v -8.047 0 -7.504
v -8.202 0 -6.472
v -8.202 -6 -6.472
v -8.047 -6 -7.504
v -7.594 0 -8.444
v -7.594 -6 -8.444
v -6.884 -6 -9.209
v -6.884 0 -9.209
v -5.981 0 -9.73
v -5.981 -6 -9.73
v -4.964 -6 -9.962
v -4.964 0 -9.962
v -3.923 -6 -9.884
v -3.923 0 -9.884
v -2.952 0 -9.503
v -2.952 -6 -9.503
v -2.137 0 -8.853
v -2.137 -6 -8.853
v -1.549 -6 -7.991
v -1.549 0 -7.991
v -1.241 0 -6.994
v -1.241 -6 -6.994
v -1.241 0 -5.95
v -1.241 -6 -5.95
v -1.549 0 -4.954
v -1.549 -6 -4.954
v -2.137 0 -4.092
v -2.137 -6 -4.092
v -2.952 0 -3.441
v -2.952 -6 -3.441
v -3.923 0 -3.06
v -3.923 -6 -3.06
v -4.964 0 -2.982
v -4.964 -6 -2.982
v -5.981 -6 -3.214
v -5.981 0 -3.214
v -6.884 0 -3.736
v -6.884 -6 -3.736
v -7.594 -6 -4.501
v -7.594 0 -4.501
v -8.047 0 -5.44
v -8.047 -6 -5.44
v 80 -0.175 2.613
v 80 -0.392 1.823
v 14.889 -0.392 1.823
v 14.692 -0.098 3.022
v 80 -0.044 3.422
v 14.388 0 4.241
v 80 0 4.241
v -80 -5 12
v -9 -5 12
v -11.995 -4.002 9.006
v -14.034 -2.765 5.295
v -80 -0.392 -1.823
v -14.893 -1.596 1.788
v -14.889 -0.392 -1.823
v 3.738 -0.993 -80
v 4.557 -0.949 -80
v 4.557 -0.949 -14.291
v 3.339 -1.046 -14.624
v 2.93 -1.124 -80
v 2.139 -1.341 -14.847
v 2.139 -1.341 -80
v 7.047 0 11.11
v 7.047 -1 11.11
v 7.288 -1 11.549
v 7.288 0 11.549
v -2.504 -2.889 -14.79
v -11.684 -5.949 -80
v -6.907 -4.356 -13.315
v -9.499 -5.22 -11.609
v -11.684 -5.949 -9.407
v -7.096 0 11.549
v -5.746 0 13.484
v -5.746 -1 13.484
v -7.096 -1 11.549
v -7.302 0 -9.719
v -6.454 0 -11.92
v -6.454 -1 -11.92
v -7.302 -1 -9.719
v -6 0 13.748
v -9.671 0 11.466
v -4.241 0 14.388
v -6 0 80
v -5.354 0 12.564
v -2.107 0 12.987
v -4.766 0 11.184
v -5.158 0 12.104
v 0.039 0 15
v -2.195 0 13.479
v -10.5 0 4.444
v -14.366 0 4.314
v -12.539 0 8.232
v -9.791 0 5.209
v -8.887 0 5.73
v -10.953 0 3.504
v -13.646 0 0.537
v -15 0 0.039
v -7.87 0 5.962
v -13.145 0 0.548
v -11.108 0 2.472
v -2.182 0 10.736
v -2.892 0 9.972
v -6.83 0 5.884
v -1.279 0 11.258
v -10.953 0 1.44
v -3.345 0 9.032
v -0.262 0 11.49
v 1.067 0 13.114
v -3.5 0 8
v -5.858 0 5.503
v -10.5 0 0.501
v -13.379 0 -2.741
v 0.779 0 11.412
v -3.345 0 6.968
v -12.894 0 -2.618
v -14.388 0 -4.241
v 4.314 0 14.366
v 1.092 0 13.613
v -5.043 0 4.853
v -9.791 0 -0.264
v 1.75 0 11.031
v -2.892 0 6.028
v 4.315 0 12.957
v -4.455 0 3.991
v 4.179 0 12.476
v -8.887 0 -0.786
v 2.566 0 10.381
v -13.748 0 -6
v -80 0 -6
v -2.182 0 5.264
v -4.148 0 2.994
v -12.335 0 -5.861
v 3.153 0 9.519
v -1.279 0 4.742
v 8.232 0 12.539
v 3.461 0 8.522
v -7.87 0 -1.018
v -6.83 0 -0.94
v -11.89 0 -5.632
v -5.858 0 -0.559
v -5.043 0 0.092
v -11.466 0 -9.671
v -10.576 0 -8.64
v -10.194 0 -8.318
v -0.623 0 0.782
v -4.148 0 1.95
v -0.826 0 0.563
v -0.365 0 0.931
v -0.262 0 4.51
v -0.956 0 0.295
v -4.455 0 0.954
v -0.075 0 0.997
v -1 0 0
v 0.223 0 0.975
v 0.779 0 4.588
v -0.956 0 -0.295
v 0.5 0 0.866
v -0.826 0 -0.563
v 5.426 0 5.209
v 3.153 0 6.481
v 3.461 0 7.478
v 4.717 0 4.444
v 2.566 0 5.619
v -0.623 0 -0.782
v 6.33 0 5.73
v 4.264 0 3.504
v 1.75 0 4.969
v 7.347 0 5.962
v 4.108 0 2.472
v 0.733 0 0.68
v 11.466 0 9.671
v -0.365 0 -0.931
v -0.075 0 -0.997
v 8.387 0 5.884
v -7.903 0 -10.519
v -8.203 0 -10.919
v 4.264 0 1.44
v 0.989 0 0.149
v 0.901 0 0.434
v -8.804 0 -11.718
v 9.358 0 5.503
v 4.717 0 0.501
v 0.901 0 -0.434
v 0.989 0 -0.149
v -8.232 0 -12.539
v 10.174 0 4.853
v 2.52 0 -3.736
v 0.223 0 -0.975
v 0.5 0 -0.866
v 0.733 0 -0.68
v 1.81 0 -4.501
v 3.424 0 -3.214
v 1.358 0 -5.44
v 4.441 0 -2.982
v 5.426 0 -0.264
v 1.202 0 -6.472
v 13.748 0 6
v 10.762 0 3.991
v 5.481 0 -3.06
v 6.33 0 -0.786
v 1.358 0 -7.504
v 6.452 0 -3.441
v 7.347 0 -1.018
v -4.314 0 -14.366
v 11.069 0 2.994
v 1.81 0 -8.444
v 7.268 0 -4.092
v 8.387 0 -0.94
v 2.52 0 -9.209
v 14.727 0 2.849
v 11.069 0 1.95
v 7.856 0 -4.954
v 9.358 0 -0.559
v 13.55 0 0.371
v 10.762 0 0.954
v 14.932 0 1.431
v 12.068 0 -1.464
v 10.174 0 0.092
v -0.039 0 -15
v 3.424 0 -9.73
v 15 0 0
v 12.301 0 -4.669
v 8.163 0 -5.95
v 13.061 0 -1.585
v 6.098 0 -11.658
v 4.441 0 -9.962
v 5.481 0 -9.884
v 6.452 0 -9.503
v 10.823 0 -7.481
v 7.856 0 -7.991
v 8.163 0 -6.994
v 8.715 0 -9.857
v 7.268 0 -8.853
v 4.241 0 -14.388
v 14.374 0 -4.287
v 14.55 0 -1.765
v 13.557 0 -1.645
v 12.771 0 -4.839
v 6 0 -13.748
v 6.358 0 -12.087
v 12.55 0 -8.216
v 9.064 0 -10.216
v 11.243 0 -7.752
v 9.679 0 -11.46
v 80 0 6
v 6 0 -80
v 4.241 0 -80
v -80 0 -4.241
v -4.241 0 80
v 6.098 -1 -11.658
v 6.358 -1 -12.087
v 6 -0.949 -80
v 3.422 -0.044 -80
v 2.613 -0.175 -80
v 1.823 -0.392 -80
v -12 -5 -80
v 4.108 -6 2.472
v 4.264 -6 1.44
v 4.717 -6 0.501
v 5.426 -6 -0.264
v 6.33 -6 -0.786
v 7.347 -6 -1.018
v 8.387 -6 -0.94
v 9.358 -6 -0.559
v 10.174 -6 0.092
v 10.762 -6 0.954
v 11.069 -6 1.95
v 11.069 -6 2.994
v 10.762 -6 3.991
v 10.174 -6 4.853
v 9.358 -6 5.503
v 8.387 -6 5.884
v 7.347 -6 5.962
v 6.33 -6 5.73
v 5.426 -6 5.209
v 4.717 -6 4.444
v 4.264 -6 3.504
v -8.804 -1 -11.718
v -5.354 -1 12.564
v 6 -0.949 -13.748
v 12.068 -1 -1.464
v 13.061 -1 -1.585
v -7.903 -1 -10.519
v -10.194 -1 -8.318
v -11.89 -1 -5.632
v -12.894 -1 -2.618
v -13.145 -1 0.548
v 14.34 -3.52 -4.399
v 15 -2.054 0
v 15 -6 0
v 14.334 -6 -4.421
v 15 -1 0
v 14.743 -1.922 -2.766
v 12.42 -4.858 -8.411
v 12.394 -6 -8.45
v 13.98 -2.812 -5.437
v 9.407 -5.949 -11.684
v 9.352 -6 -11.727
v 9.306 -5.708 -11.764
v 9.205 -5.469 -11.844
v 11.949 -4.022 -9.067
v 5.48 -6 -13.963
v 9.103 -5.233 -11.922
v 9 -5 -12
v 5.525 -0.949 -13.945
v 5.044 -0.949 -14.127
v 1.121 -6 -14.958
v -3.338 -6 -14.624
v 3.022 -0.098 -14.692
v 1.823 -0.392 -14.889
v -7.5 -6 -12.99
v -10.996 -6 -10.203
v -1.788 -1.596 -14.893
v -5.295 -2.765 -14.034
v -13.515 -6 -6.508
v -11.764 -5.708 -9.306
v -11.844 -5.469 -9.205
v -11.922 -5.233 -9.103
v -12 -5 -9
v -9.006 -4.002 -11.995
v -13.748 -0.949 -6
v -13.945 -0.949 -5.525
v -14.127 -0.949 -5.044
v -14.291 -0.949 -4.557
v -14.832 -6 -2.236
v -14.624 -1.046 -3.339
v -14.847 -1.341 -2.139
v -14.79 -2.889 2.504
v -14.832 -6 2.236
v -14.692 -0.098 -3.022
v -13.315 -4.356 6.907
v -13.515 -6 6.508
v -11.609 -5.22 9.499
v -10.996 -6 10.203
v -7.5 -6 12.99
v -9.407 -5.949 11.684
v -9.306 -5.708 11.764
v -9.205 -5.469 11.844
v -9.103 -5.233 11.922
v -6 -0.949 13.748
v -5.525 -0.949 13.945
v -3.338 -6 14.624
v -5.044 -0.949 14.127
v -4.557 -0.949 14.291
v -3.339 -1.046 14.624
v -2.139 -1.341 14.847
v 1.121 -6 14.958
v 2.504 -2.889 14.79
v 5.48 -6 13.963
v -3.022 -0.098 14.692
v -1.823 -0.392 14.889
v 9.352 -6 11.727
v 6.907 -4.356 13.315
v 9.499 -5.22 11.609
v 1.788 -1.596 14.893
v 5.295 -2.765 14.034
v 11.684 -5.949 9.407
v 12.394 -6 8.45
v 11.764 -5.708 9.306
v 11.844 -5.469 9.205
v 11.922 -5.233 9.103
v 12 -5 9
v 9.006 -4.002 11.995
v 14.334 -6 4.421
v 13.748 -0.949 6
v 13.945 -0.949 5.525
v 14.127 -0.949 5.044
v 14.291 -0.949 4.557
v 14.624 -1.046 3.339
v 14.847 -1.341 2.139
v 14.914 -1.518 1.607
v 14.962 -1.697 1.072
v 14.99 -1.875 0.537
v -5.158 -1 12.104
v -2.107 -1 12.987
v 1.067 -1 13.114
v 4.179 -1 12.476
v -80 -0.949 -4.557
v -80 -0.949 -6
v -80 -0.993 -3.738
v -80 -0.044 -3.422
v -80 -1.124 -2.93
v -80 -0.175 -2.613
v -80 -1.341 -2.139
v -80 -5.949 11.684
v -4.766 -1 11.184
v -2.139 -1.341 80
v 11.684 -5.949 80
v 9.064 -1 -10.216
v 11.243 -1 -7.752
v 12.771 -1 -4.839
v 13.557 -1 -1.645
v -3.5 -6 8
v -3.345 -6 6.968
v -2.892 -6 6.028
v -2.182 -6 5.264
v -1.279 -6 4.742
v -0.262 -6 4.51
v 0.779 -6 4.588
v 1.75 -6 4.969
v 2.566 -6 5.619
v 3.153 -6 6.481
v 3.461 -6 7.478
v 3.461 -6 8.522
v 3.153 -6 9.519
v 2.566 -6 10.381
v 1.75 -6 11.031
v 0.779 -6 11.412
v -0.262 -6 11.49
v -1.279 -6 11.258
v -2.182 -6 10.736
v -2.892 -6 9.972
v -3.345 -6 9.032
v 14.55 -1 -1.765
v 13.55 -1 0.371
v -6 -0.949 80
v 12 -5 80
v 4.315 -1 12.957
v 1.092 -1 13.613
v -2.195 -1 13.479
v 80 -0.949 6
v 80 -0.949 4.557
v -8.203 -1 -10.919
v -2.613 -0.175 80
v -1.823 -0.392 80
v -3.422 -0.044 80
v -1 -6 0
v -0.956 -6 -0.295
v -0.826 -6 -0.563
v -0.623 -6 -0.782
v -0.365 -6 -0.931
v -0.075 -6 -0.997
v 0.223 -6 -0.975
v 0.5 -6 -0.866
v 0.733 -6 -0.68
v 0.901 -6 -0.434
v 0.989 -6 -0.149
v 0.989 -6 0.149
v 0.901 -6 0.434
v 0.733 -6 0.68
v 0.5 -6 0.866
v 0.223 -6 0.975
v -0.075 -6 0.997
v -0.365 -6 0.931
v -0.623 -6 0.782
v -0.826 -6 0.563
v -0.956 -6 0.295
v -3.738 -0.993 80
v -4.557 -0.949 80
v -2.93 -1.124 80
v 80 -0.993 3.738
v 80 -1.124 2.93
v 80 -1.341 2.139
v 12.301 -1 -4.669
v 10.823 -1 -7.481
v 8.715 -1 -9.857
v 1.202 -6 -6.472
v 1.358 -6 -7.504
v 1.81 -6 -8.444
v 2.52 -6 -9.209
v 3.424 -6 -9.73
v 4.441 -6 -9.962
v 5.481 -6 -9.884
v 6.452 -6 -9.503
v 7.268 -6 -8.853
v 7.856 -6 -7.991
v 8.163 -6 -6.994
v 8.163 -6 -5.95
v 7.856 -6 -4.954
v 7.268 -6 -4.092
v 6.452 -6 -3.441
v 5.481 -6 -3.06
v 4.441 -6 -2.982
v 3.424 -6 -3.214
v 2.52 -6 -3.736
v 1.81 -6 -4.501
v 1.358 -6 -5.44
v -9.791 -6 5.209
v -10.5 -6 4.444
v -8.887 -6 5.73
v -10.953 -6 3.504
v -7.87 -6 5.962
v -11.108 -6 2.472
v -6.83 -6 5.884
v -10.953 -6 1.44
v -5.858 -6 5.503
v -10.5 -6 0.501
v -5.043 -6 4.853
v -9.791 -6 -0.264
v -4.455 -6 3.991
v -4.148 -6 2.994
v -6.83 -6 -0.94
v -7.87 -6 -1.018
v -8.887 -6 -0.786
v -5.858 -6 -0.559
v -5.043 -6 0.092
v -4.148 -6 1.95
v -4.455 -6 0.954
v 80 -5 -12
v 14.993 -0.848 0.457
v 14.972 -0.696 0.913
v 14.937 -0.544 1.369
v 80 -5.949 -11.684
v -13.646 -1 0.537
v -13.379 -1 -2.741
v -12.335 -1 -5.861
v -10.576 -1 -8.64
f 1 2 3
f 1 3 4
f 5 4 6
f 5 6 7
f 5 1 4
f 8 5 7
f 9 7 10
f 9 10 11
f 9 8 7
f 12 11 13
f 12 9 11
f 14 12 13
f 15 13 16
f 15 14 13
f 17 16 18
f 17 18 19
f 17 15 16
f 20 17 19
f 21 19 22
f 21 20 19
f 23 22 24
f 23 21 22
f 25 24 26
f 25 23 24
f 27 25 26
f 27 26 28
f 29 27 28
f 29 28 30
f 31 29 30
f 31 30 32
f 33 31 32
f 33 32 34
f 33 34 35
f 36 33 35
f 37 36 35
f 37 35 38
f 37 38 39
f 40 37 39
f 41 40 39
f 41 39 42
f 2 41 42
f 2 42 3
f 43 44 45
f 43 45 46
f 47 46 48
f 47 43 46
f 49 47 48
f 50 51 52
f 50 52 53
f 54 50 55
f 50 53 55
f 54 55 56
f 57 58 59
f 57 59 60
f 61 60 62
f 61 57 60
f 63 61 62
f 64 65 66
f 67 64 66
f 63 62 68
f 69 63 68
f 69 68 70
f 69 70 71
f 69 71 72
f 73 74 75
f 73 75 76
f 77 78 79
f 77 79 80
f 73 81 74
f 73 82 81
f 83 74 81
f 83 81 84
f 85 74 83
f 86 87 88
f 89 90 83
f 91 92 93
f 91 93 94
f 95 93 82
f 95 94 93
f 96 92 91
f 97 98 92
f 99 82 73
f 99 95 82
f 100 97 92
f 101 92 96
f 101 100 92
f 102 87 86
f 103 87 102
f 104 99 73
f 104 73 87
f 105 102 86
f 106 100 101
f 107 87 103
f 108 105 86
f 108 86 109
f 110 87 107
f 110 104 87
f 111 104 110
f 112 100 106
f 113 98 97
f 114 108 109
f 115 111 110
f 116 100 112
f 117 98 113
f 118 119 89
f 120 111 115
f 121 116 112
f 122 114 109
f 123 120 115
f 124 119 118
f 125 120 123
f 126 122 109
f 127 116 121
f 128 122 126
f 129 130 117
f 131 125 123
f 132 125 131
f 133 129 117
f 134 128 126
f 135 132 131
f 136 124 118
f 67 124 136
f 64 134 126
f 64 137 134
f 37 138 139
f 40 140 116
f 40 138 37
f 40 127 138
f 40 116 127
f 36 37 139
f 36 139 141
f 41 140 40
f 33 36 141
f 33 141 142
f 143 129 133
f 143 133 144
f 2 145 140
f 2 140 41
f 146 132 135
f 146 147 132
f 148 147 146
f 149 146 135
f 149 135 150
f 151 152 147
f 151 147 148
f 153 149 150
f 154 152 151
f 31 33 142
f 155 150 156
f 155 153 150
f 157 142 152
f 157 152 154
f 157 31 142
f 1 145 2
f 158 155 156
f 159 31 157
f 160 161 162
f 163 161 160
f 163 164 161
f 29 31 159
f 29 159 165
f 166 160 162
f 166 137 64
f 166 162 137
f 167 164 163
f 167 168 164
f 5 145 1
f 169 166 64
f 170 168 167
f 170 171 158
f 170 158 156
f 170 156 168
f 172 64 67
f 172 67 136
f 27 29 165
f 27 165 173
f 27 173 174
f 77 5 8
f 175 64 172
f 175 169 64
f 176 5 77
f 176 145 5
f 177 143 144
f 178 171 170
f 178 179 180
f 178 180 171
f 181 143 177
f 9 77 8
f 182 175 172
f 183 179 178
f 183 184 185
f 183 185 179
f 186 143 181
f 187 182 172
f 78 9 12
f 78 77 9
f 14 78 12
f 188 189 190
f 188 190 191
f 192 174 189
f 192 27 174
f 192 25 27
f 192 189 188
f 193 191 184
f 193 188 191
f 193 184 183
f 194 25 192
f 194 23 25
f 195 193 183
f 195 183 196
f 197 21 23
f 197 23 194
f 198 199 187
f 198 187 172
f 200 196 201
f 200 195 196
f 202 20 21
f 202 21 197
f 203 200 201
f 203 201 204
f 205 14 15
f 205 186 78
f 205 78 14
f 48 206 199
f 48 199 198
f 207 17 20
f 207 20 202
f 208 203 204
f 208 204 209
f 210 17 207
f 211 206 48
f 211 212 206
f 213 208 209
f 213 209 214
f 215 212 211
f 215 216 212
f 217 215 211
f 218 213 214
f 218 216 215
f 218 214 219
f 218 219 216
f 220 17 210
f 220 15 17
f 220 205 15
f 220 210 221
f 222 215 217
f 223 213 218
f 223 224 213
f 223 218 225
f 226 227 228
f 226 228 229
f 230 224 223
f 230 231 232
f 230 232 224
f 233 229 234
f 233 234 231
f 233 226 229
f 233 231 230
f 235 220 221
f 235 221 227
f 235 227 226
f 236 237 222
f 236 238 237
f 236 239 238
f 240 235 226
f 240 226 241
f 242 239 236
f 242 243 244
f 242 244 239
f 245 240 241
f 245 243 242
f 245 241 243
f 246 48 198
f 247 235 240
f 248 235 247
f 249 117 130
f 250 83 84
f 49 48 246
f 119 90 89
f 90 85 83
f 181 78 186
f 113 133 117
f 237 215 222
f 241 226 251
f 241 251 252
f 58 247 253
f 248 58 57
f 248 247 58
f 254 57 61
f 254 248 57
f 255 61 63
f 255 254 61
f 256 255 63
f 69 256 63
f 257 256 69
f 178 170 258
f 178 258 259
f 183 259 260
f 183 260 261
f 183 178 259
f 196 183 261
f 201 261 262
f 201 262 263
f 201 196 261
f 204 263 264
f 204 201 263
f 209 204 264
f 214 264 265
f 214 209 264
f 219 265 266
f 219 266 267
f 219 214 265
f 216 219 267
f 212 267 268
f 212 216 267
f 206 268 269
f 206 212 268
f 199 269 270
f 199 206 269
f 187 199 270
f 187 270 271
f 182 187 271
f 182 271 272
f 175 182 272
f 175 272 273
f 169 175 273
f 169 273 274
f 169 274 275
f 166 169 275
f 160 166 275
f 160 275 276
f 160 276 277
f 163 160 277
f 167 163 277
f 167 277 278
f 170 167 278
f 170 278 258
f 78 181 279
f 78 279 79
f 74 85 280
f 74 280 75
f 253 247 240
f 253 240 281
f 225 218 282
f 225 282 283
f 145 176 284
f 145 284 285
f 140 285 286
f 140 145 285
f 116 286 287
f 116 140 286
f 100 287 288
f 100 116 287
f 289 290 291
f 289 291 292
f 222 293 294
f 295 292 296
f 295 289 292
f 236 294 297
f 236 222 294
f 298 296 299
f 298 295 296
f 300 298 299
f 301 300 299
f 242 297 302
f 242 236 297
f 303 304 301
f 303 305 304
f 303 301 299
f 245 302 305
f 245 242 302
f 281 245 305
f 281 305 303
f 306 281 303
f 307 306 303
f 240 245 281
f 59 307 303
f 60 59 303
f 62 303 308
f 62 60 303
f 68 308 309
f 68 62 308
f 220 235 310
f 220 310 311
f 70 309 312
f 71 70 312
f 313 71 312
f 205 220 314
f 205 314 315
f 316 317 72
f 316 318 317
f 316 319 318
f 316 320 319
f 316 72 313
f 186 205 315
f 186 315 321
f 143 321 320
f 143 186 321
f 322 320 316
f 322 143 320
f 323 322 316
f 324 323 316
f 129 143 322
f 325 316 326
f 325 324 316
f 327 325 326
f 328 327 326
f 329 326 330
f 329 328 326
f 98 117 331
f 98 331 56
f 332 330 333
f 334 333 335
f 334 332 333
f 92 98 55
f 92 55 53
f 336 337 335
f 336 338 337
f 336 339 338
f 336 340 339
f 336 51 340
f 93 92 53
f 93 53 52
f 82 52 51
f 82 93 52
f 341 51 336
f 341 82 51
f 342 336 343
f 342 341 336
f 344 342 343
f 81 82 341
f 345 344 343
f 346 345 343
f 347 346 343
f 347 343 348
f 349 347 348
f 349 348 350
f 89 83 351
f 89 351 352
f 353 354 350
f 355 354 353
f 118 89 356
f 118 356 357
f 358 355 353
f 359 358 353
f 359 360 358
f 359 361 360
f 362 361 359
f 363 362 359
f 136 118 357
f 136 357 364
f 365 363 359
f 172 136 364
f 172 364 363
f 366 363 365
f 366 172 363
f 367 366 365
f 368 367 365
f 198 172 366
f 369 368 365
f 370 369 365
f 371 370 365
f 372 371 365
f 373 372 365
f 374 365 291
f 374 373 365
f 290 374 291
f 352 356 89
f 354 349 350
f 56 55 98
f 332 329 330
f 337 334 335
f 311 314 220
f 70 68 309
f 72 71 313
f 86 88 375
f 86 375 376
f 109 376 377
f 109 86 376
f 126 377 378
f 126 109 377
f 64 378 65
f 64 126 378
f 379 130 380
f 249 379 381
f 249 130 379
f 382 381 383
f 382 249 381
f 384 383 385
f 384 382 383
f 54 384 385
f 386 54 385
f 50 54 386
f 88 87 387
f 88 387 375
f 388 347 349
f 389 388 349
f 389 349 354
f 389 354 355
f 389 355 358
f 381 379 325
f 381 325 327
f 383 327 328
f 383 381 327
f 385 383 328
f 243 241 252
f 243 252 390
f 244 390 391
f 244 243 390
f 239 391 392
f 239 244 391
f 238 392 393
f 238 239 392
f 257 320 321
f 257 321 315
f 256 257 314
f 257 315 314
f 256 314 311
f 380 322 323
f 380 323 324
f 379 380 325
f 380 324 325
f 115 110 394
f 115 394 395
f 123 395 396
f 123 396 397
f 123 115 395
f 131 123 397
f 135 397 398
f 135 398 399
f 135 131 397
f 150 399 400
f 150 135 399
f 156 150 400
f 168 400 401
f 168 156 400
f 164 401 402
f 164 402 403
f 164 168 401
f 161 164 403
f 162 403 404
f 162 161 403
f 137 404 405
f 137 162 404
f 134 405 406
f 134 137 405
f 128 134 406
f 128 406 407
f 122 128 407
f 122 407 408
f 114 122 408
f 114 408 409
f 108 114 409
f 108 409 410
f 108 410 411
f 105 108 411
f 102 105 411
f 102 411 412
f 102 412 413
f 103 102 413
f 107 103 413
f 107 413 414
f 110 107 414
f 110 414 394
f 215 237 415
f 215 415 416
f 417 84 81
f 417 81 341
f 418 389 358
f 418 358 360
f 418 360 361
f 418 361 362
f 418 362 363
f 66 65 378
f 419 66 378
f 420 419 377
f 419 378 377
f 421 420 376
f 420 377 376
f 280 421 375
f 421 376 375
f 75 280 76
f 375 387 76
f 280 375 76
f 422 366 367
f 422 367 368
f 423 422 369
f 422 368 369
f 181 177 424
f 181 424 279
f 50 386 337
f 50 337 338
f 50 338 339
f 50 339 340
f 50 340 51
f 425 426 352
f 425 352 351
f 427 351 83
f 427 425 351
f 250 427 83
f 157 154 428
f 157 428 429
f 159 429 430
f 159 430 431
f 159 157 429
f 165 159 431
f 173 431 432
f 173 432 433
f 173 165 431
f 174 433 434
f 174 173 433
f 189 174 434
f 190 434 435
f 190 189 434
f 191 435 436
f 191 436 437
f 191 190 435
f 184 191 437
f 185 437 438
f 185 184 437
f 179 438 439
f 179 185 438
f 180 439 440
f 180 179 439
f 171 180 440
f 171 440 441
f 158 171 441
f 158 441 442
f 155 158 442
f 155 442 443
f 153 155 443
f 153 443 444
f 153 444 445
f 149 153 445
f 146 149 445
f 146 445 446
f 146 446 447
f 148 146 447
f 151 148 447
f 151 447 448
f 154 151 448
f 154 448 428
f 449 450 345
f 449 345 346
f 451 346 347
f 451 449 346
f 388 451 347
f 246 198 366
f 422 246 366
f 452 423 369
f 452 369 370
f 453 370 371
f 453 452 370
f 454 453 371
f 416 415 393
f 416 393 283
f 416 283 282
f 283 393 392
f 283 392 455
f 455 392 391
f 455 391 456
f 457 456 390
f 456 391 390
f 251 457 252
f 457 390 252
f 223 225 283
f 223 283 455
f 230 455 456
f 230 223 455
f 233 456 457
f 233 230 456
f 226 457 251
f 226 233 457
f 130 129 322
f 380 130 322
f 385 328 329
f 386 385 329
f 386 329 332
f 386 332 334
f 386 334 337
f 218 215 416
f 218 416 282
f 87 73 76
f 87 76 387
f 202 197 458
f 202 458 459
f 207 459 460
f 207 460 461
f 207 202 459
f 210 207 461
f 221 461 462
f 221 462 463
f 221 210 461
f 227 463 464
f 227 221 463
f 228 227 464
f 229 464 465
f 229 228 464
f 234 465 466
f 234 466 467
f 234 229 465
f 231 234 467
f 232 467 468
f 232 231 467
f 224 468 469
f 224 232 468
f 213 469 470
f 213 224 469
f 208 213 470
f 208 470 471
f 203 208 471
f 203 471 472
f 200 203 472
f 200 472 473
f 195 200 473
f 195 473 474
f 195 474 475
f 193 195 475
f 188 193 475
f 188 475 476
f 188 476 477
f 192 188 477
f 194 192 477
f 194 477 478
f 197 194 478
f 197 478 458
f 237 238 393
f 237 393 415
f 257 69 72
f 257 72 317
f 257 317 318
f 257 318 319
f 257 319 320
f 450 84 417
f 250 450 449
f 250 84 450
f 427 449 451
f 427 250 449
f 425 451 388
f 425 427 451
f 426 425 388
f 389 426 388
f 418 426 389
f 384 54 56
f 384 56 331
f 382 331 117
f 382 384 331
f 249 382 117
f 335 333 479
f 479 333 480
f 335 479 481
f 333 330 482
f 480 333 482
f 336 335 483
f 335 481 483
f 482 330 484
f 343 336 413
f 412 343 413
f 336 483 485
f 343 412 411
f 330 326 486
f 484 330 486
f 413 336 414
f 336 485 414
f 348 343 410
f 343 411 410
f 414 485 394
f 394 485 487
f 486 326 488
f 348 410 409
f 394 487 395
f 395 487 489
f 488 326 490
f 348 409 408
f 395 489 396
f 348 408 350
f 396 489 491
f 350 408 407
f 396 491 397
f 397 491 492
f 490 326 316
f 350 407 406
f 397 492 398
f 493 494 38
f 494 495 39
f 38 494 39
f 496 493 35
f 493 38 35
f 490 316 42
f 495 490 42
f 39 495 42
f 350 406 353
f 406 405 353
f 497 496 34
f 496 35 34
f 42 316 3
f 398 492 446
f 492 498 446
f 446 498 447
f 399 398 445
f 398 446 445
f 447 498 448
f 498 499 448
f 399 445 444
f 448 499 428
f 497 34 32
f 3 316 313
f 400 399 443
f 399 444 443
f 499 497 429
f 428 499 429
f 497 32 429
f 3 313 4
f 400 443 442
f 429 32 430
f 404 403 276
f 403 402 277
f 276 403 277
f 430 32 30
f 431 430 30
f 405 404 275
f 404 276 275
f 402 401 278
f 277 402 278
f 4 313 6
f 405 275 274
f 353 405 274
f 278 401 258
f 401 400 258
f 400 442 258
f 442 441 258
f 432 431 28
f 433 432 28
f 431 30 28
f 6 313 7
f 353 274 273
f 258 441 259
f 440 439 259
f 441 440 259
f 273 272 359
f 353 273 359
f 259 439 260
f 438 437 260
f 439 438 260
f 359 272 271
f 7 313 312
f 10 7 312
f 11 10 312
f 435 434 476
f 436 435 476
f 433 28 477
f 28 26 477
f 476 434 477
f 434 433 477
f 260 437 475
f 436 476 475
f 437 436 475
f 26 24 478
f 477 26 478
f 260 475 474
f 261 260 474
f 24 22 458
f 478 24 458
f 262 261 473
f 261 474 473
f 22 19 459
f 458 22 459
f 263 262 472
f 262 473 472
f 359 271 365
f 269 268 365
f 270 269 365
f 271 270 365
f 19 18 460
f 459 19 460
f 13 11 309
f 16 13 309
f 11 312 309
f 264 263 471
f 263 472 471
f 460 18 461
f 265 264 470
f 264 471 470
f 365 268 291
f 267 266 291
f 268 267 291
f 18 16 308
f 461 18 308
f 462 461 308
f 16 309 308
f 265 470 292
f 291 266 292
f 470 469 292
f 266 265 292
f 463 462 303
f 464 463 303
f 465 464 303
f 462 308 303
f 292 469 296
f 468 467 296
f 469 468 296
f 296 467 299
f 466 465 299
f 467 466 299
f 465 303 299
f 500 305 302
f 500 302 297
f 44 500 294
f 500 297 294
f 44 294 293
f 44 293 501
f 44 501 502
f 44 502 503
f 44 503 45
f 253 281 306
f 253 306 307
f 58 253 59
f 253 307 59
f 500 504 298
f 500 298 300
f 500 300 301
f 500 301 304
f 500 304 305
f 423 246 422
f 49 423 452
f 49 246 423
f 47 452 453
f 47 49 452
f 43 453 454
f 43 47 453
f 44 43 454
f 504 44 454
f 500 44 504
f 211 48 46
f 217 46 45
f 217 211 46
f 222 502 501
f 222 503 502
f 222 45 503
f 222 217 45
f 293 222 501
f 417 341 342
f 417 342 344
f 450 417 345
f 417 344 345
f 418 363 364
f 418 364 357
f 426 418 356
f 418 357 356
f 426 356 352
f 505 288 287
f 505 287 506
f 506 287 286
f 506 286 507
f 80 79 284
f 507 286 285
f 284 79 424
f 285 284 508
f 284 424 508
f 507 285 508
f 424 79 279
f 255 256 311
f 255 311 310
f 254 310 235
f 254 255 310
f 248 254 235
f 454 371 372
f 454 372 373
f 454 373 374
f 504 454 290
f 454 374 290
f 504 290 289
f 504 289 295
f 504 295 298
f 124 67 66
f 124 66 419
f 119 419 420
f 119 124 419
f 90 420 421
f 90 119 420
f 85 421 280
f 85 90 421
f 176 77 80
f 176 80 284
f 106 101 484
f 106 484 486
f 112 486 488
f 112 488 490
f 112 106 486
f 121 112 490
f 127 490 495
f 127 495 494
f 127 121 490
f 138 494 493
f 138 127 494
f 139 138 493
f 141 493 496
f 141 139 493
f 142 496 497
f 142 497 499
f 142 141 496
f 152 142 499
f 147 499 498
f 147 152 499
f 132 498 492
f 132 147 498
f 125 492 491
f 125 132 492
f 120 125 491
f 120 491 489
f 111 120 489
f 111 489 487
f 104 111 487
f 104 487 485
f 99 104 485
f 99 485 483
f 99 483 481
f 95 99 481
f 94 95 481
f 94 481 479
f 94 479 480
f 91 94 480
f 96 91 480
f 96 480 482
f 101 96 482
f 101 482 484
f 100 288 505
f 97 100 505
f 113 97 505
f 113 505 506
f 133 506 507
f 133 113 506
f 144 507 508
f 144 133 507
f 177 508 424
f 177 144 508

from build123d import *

# Parameters (mm, degrees)
F1_DEPTH  = 80
F2_R      = 7.644408
F4_COUNT  = 4
F5_R      = 15
F6_DEPTH  = 6
F7_R      = 3.5
F7_R_2    = 1
F8_DEPTH  = 25
F10_DEPTH = 1


with BuildPart() as f1:
    # F0 (on Top) → F1 (new body)
    with BuildSketch(Plane.XY):
        Polygon((11.683772, -5.948683), (12, -5), (-3, 0), (-3.316228, -0.948683), align=None)
        Polygon((-3.316228, -0.948683), (-3, 0), (-6, 0), (-6, -0.948683), align=None)
    extrude(amount=-F1_DEPTH)

    # F2
    f2_edges = [f1.edges().sort_by_distance(p)[0] for p in [
        (-3.316228, -0.948683, -40),
        (-3, 0, -40),
    ]]
    fillet(f2_edges, radius=F2_R)



with BuildPart() as f4_1:
    # F4: instance of F1
    add(f1.part.rotate(Axis((0, 13.525062, 0), (0, 1, 0)), 1 * 360 / F4_COUNT))


with BuildPart() as f4_2:
    # F4: instance of F1
    add(f1.part.rotate(Axis((0, 13.525062, 0), (0, 1, 0)), 2 * 360 / F4_COUNT))


with BuildPart() as f4_3:
    # F4: instance of F1
    add(f1.part.rotate(Axis((0, 13.525062, 0), (0, 1, 0)), 3 * 360 / F4_COUNT))


with BuildPart() as f1_1:
    add(f1.part)

    add(f4_1.part)  # F6 merges F4_1

    add(f4_2.part)  # F6 merges F4_2

    add(f4_3.part)  # F6 merges F4_3
    # F5 (on Front) → F6 (join)
    with BuildSketch(Plane.XZ):
        Circle(F5_R)
    extrude(amount=F6_DEPTH)

    # F7 (on face) → F8 (cut)
    with BuildSketch(Plane(origin=(0, 0, 0), x_dir=(-1, 0, 0), z_dir=(0, 1, 0))):
        with Locations((-4.702282, 6.472136)):
            Circle(F7_R)
        with Locations((-7.608452, -2.472136)):
            Circle(F7_R)
        with Locations((0, -8)):
            Circle(F7_R)
        with Locations((7.608452, -2.472136)):
            Circle(F7_R)
        with Locations((4.702282, 6.472136)):
            Circle(F7_R)
        Circle(F7_R_2)
    extrude(amount=-F8_DEPTH, mode=Mode.SUBTRACT)

    # F9 (on face) → F10 (cut)
    with BuildSketch(Plane(origin=(0, 0, 0), x_dir=(-1, 0, 0), z_dir=(0, 1, 0))):
        with BuildLine():
            ThreePointArc((5.158171, -12.103592), (-1.067262, -13.113528), (-7.047458, -11.110221))
            Line((-7.047458, -11.110221), (-7.288358, -11.549476))
            ThreePointArc((-7.288358, -11.549476), (-1.091943, -13.613164), (5.354197, -12.563564))
            Line((5.354197, -12.563564), (5.746248, -13.483508))
            Line((5.746248, -13.483508), (7.096071, -11.549476))
            Line((7.096071, -11.549476), (4.76612, -11.183649))
            Line((4.76612, -11.183649), (5.158171, -12.103592))
        make_face()
        with BuildLine():
            Line((8.803936, 11.71815), (6.454104, 11.920116))
            Line((6.454104, 11.920116), (7.302264, 9.719405))
            Line((7.302264, 9.719405), (7.902933, 10.518903))
            ThreePointArc((7.902933, 10.518903), (11.89028, 5.632489), (13.145463, -0.548167))
            Line((13.145463, -0.548167), (13.646319, -0.537165))
            ThreePointArc((13.646319, -0.537165), (12.335317, 5.860932), (8.203267, 10.918652))
            Line((8.203267, 10.918652), (8.803936, 11.71815))
        make_face()
        with BuildLine():
            Line((-14.550184, 1.765357), (-13.550175, -0.370639))
            Line((-13.550175, -0.370639), (-12.068384, 1.464243))
            Line((-12.068384, 1.464243), (-13.061104, 1.584689))
            ThreePointArc((-13.061104, 1.584689), (-10.823018, 7.48104), (-6.098005, 11.658388))
            Line((-6.098005, 11.658388), (-6.357961, 12.086641))
            ThreePointArc((-6.357961, 12.086641), (-11.243374, 7.752232), (-13.557464, 1.644912))
            Line((-13.557464, 1.644912), (-14.550184, 1.765357))
        make_face()
    extrude(amount=-F10_DEPTH, mode=Mode.SUBTRACT)


with BuildPart() as f11_1:
    # F11: instance of F1
    add(f1_1.part.mirror(Plane.XY))


solid = f11_1.part
